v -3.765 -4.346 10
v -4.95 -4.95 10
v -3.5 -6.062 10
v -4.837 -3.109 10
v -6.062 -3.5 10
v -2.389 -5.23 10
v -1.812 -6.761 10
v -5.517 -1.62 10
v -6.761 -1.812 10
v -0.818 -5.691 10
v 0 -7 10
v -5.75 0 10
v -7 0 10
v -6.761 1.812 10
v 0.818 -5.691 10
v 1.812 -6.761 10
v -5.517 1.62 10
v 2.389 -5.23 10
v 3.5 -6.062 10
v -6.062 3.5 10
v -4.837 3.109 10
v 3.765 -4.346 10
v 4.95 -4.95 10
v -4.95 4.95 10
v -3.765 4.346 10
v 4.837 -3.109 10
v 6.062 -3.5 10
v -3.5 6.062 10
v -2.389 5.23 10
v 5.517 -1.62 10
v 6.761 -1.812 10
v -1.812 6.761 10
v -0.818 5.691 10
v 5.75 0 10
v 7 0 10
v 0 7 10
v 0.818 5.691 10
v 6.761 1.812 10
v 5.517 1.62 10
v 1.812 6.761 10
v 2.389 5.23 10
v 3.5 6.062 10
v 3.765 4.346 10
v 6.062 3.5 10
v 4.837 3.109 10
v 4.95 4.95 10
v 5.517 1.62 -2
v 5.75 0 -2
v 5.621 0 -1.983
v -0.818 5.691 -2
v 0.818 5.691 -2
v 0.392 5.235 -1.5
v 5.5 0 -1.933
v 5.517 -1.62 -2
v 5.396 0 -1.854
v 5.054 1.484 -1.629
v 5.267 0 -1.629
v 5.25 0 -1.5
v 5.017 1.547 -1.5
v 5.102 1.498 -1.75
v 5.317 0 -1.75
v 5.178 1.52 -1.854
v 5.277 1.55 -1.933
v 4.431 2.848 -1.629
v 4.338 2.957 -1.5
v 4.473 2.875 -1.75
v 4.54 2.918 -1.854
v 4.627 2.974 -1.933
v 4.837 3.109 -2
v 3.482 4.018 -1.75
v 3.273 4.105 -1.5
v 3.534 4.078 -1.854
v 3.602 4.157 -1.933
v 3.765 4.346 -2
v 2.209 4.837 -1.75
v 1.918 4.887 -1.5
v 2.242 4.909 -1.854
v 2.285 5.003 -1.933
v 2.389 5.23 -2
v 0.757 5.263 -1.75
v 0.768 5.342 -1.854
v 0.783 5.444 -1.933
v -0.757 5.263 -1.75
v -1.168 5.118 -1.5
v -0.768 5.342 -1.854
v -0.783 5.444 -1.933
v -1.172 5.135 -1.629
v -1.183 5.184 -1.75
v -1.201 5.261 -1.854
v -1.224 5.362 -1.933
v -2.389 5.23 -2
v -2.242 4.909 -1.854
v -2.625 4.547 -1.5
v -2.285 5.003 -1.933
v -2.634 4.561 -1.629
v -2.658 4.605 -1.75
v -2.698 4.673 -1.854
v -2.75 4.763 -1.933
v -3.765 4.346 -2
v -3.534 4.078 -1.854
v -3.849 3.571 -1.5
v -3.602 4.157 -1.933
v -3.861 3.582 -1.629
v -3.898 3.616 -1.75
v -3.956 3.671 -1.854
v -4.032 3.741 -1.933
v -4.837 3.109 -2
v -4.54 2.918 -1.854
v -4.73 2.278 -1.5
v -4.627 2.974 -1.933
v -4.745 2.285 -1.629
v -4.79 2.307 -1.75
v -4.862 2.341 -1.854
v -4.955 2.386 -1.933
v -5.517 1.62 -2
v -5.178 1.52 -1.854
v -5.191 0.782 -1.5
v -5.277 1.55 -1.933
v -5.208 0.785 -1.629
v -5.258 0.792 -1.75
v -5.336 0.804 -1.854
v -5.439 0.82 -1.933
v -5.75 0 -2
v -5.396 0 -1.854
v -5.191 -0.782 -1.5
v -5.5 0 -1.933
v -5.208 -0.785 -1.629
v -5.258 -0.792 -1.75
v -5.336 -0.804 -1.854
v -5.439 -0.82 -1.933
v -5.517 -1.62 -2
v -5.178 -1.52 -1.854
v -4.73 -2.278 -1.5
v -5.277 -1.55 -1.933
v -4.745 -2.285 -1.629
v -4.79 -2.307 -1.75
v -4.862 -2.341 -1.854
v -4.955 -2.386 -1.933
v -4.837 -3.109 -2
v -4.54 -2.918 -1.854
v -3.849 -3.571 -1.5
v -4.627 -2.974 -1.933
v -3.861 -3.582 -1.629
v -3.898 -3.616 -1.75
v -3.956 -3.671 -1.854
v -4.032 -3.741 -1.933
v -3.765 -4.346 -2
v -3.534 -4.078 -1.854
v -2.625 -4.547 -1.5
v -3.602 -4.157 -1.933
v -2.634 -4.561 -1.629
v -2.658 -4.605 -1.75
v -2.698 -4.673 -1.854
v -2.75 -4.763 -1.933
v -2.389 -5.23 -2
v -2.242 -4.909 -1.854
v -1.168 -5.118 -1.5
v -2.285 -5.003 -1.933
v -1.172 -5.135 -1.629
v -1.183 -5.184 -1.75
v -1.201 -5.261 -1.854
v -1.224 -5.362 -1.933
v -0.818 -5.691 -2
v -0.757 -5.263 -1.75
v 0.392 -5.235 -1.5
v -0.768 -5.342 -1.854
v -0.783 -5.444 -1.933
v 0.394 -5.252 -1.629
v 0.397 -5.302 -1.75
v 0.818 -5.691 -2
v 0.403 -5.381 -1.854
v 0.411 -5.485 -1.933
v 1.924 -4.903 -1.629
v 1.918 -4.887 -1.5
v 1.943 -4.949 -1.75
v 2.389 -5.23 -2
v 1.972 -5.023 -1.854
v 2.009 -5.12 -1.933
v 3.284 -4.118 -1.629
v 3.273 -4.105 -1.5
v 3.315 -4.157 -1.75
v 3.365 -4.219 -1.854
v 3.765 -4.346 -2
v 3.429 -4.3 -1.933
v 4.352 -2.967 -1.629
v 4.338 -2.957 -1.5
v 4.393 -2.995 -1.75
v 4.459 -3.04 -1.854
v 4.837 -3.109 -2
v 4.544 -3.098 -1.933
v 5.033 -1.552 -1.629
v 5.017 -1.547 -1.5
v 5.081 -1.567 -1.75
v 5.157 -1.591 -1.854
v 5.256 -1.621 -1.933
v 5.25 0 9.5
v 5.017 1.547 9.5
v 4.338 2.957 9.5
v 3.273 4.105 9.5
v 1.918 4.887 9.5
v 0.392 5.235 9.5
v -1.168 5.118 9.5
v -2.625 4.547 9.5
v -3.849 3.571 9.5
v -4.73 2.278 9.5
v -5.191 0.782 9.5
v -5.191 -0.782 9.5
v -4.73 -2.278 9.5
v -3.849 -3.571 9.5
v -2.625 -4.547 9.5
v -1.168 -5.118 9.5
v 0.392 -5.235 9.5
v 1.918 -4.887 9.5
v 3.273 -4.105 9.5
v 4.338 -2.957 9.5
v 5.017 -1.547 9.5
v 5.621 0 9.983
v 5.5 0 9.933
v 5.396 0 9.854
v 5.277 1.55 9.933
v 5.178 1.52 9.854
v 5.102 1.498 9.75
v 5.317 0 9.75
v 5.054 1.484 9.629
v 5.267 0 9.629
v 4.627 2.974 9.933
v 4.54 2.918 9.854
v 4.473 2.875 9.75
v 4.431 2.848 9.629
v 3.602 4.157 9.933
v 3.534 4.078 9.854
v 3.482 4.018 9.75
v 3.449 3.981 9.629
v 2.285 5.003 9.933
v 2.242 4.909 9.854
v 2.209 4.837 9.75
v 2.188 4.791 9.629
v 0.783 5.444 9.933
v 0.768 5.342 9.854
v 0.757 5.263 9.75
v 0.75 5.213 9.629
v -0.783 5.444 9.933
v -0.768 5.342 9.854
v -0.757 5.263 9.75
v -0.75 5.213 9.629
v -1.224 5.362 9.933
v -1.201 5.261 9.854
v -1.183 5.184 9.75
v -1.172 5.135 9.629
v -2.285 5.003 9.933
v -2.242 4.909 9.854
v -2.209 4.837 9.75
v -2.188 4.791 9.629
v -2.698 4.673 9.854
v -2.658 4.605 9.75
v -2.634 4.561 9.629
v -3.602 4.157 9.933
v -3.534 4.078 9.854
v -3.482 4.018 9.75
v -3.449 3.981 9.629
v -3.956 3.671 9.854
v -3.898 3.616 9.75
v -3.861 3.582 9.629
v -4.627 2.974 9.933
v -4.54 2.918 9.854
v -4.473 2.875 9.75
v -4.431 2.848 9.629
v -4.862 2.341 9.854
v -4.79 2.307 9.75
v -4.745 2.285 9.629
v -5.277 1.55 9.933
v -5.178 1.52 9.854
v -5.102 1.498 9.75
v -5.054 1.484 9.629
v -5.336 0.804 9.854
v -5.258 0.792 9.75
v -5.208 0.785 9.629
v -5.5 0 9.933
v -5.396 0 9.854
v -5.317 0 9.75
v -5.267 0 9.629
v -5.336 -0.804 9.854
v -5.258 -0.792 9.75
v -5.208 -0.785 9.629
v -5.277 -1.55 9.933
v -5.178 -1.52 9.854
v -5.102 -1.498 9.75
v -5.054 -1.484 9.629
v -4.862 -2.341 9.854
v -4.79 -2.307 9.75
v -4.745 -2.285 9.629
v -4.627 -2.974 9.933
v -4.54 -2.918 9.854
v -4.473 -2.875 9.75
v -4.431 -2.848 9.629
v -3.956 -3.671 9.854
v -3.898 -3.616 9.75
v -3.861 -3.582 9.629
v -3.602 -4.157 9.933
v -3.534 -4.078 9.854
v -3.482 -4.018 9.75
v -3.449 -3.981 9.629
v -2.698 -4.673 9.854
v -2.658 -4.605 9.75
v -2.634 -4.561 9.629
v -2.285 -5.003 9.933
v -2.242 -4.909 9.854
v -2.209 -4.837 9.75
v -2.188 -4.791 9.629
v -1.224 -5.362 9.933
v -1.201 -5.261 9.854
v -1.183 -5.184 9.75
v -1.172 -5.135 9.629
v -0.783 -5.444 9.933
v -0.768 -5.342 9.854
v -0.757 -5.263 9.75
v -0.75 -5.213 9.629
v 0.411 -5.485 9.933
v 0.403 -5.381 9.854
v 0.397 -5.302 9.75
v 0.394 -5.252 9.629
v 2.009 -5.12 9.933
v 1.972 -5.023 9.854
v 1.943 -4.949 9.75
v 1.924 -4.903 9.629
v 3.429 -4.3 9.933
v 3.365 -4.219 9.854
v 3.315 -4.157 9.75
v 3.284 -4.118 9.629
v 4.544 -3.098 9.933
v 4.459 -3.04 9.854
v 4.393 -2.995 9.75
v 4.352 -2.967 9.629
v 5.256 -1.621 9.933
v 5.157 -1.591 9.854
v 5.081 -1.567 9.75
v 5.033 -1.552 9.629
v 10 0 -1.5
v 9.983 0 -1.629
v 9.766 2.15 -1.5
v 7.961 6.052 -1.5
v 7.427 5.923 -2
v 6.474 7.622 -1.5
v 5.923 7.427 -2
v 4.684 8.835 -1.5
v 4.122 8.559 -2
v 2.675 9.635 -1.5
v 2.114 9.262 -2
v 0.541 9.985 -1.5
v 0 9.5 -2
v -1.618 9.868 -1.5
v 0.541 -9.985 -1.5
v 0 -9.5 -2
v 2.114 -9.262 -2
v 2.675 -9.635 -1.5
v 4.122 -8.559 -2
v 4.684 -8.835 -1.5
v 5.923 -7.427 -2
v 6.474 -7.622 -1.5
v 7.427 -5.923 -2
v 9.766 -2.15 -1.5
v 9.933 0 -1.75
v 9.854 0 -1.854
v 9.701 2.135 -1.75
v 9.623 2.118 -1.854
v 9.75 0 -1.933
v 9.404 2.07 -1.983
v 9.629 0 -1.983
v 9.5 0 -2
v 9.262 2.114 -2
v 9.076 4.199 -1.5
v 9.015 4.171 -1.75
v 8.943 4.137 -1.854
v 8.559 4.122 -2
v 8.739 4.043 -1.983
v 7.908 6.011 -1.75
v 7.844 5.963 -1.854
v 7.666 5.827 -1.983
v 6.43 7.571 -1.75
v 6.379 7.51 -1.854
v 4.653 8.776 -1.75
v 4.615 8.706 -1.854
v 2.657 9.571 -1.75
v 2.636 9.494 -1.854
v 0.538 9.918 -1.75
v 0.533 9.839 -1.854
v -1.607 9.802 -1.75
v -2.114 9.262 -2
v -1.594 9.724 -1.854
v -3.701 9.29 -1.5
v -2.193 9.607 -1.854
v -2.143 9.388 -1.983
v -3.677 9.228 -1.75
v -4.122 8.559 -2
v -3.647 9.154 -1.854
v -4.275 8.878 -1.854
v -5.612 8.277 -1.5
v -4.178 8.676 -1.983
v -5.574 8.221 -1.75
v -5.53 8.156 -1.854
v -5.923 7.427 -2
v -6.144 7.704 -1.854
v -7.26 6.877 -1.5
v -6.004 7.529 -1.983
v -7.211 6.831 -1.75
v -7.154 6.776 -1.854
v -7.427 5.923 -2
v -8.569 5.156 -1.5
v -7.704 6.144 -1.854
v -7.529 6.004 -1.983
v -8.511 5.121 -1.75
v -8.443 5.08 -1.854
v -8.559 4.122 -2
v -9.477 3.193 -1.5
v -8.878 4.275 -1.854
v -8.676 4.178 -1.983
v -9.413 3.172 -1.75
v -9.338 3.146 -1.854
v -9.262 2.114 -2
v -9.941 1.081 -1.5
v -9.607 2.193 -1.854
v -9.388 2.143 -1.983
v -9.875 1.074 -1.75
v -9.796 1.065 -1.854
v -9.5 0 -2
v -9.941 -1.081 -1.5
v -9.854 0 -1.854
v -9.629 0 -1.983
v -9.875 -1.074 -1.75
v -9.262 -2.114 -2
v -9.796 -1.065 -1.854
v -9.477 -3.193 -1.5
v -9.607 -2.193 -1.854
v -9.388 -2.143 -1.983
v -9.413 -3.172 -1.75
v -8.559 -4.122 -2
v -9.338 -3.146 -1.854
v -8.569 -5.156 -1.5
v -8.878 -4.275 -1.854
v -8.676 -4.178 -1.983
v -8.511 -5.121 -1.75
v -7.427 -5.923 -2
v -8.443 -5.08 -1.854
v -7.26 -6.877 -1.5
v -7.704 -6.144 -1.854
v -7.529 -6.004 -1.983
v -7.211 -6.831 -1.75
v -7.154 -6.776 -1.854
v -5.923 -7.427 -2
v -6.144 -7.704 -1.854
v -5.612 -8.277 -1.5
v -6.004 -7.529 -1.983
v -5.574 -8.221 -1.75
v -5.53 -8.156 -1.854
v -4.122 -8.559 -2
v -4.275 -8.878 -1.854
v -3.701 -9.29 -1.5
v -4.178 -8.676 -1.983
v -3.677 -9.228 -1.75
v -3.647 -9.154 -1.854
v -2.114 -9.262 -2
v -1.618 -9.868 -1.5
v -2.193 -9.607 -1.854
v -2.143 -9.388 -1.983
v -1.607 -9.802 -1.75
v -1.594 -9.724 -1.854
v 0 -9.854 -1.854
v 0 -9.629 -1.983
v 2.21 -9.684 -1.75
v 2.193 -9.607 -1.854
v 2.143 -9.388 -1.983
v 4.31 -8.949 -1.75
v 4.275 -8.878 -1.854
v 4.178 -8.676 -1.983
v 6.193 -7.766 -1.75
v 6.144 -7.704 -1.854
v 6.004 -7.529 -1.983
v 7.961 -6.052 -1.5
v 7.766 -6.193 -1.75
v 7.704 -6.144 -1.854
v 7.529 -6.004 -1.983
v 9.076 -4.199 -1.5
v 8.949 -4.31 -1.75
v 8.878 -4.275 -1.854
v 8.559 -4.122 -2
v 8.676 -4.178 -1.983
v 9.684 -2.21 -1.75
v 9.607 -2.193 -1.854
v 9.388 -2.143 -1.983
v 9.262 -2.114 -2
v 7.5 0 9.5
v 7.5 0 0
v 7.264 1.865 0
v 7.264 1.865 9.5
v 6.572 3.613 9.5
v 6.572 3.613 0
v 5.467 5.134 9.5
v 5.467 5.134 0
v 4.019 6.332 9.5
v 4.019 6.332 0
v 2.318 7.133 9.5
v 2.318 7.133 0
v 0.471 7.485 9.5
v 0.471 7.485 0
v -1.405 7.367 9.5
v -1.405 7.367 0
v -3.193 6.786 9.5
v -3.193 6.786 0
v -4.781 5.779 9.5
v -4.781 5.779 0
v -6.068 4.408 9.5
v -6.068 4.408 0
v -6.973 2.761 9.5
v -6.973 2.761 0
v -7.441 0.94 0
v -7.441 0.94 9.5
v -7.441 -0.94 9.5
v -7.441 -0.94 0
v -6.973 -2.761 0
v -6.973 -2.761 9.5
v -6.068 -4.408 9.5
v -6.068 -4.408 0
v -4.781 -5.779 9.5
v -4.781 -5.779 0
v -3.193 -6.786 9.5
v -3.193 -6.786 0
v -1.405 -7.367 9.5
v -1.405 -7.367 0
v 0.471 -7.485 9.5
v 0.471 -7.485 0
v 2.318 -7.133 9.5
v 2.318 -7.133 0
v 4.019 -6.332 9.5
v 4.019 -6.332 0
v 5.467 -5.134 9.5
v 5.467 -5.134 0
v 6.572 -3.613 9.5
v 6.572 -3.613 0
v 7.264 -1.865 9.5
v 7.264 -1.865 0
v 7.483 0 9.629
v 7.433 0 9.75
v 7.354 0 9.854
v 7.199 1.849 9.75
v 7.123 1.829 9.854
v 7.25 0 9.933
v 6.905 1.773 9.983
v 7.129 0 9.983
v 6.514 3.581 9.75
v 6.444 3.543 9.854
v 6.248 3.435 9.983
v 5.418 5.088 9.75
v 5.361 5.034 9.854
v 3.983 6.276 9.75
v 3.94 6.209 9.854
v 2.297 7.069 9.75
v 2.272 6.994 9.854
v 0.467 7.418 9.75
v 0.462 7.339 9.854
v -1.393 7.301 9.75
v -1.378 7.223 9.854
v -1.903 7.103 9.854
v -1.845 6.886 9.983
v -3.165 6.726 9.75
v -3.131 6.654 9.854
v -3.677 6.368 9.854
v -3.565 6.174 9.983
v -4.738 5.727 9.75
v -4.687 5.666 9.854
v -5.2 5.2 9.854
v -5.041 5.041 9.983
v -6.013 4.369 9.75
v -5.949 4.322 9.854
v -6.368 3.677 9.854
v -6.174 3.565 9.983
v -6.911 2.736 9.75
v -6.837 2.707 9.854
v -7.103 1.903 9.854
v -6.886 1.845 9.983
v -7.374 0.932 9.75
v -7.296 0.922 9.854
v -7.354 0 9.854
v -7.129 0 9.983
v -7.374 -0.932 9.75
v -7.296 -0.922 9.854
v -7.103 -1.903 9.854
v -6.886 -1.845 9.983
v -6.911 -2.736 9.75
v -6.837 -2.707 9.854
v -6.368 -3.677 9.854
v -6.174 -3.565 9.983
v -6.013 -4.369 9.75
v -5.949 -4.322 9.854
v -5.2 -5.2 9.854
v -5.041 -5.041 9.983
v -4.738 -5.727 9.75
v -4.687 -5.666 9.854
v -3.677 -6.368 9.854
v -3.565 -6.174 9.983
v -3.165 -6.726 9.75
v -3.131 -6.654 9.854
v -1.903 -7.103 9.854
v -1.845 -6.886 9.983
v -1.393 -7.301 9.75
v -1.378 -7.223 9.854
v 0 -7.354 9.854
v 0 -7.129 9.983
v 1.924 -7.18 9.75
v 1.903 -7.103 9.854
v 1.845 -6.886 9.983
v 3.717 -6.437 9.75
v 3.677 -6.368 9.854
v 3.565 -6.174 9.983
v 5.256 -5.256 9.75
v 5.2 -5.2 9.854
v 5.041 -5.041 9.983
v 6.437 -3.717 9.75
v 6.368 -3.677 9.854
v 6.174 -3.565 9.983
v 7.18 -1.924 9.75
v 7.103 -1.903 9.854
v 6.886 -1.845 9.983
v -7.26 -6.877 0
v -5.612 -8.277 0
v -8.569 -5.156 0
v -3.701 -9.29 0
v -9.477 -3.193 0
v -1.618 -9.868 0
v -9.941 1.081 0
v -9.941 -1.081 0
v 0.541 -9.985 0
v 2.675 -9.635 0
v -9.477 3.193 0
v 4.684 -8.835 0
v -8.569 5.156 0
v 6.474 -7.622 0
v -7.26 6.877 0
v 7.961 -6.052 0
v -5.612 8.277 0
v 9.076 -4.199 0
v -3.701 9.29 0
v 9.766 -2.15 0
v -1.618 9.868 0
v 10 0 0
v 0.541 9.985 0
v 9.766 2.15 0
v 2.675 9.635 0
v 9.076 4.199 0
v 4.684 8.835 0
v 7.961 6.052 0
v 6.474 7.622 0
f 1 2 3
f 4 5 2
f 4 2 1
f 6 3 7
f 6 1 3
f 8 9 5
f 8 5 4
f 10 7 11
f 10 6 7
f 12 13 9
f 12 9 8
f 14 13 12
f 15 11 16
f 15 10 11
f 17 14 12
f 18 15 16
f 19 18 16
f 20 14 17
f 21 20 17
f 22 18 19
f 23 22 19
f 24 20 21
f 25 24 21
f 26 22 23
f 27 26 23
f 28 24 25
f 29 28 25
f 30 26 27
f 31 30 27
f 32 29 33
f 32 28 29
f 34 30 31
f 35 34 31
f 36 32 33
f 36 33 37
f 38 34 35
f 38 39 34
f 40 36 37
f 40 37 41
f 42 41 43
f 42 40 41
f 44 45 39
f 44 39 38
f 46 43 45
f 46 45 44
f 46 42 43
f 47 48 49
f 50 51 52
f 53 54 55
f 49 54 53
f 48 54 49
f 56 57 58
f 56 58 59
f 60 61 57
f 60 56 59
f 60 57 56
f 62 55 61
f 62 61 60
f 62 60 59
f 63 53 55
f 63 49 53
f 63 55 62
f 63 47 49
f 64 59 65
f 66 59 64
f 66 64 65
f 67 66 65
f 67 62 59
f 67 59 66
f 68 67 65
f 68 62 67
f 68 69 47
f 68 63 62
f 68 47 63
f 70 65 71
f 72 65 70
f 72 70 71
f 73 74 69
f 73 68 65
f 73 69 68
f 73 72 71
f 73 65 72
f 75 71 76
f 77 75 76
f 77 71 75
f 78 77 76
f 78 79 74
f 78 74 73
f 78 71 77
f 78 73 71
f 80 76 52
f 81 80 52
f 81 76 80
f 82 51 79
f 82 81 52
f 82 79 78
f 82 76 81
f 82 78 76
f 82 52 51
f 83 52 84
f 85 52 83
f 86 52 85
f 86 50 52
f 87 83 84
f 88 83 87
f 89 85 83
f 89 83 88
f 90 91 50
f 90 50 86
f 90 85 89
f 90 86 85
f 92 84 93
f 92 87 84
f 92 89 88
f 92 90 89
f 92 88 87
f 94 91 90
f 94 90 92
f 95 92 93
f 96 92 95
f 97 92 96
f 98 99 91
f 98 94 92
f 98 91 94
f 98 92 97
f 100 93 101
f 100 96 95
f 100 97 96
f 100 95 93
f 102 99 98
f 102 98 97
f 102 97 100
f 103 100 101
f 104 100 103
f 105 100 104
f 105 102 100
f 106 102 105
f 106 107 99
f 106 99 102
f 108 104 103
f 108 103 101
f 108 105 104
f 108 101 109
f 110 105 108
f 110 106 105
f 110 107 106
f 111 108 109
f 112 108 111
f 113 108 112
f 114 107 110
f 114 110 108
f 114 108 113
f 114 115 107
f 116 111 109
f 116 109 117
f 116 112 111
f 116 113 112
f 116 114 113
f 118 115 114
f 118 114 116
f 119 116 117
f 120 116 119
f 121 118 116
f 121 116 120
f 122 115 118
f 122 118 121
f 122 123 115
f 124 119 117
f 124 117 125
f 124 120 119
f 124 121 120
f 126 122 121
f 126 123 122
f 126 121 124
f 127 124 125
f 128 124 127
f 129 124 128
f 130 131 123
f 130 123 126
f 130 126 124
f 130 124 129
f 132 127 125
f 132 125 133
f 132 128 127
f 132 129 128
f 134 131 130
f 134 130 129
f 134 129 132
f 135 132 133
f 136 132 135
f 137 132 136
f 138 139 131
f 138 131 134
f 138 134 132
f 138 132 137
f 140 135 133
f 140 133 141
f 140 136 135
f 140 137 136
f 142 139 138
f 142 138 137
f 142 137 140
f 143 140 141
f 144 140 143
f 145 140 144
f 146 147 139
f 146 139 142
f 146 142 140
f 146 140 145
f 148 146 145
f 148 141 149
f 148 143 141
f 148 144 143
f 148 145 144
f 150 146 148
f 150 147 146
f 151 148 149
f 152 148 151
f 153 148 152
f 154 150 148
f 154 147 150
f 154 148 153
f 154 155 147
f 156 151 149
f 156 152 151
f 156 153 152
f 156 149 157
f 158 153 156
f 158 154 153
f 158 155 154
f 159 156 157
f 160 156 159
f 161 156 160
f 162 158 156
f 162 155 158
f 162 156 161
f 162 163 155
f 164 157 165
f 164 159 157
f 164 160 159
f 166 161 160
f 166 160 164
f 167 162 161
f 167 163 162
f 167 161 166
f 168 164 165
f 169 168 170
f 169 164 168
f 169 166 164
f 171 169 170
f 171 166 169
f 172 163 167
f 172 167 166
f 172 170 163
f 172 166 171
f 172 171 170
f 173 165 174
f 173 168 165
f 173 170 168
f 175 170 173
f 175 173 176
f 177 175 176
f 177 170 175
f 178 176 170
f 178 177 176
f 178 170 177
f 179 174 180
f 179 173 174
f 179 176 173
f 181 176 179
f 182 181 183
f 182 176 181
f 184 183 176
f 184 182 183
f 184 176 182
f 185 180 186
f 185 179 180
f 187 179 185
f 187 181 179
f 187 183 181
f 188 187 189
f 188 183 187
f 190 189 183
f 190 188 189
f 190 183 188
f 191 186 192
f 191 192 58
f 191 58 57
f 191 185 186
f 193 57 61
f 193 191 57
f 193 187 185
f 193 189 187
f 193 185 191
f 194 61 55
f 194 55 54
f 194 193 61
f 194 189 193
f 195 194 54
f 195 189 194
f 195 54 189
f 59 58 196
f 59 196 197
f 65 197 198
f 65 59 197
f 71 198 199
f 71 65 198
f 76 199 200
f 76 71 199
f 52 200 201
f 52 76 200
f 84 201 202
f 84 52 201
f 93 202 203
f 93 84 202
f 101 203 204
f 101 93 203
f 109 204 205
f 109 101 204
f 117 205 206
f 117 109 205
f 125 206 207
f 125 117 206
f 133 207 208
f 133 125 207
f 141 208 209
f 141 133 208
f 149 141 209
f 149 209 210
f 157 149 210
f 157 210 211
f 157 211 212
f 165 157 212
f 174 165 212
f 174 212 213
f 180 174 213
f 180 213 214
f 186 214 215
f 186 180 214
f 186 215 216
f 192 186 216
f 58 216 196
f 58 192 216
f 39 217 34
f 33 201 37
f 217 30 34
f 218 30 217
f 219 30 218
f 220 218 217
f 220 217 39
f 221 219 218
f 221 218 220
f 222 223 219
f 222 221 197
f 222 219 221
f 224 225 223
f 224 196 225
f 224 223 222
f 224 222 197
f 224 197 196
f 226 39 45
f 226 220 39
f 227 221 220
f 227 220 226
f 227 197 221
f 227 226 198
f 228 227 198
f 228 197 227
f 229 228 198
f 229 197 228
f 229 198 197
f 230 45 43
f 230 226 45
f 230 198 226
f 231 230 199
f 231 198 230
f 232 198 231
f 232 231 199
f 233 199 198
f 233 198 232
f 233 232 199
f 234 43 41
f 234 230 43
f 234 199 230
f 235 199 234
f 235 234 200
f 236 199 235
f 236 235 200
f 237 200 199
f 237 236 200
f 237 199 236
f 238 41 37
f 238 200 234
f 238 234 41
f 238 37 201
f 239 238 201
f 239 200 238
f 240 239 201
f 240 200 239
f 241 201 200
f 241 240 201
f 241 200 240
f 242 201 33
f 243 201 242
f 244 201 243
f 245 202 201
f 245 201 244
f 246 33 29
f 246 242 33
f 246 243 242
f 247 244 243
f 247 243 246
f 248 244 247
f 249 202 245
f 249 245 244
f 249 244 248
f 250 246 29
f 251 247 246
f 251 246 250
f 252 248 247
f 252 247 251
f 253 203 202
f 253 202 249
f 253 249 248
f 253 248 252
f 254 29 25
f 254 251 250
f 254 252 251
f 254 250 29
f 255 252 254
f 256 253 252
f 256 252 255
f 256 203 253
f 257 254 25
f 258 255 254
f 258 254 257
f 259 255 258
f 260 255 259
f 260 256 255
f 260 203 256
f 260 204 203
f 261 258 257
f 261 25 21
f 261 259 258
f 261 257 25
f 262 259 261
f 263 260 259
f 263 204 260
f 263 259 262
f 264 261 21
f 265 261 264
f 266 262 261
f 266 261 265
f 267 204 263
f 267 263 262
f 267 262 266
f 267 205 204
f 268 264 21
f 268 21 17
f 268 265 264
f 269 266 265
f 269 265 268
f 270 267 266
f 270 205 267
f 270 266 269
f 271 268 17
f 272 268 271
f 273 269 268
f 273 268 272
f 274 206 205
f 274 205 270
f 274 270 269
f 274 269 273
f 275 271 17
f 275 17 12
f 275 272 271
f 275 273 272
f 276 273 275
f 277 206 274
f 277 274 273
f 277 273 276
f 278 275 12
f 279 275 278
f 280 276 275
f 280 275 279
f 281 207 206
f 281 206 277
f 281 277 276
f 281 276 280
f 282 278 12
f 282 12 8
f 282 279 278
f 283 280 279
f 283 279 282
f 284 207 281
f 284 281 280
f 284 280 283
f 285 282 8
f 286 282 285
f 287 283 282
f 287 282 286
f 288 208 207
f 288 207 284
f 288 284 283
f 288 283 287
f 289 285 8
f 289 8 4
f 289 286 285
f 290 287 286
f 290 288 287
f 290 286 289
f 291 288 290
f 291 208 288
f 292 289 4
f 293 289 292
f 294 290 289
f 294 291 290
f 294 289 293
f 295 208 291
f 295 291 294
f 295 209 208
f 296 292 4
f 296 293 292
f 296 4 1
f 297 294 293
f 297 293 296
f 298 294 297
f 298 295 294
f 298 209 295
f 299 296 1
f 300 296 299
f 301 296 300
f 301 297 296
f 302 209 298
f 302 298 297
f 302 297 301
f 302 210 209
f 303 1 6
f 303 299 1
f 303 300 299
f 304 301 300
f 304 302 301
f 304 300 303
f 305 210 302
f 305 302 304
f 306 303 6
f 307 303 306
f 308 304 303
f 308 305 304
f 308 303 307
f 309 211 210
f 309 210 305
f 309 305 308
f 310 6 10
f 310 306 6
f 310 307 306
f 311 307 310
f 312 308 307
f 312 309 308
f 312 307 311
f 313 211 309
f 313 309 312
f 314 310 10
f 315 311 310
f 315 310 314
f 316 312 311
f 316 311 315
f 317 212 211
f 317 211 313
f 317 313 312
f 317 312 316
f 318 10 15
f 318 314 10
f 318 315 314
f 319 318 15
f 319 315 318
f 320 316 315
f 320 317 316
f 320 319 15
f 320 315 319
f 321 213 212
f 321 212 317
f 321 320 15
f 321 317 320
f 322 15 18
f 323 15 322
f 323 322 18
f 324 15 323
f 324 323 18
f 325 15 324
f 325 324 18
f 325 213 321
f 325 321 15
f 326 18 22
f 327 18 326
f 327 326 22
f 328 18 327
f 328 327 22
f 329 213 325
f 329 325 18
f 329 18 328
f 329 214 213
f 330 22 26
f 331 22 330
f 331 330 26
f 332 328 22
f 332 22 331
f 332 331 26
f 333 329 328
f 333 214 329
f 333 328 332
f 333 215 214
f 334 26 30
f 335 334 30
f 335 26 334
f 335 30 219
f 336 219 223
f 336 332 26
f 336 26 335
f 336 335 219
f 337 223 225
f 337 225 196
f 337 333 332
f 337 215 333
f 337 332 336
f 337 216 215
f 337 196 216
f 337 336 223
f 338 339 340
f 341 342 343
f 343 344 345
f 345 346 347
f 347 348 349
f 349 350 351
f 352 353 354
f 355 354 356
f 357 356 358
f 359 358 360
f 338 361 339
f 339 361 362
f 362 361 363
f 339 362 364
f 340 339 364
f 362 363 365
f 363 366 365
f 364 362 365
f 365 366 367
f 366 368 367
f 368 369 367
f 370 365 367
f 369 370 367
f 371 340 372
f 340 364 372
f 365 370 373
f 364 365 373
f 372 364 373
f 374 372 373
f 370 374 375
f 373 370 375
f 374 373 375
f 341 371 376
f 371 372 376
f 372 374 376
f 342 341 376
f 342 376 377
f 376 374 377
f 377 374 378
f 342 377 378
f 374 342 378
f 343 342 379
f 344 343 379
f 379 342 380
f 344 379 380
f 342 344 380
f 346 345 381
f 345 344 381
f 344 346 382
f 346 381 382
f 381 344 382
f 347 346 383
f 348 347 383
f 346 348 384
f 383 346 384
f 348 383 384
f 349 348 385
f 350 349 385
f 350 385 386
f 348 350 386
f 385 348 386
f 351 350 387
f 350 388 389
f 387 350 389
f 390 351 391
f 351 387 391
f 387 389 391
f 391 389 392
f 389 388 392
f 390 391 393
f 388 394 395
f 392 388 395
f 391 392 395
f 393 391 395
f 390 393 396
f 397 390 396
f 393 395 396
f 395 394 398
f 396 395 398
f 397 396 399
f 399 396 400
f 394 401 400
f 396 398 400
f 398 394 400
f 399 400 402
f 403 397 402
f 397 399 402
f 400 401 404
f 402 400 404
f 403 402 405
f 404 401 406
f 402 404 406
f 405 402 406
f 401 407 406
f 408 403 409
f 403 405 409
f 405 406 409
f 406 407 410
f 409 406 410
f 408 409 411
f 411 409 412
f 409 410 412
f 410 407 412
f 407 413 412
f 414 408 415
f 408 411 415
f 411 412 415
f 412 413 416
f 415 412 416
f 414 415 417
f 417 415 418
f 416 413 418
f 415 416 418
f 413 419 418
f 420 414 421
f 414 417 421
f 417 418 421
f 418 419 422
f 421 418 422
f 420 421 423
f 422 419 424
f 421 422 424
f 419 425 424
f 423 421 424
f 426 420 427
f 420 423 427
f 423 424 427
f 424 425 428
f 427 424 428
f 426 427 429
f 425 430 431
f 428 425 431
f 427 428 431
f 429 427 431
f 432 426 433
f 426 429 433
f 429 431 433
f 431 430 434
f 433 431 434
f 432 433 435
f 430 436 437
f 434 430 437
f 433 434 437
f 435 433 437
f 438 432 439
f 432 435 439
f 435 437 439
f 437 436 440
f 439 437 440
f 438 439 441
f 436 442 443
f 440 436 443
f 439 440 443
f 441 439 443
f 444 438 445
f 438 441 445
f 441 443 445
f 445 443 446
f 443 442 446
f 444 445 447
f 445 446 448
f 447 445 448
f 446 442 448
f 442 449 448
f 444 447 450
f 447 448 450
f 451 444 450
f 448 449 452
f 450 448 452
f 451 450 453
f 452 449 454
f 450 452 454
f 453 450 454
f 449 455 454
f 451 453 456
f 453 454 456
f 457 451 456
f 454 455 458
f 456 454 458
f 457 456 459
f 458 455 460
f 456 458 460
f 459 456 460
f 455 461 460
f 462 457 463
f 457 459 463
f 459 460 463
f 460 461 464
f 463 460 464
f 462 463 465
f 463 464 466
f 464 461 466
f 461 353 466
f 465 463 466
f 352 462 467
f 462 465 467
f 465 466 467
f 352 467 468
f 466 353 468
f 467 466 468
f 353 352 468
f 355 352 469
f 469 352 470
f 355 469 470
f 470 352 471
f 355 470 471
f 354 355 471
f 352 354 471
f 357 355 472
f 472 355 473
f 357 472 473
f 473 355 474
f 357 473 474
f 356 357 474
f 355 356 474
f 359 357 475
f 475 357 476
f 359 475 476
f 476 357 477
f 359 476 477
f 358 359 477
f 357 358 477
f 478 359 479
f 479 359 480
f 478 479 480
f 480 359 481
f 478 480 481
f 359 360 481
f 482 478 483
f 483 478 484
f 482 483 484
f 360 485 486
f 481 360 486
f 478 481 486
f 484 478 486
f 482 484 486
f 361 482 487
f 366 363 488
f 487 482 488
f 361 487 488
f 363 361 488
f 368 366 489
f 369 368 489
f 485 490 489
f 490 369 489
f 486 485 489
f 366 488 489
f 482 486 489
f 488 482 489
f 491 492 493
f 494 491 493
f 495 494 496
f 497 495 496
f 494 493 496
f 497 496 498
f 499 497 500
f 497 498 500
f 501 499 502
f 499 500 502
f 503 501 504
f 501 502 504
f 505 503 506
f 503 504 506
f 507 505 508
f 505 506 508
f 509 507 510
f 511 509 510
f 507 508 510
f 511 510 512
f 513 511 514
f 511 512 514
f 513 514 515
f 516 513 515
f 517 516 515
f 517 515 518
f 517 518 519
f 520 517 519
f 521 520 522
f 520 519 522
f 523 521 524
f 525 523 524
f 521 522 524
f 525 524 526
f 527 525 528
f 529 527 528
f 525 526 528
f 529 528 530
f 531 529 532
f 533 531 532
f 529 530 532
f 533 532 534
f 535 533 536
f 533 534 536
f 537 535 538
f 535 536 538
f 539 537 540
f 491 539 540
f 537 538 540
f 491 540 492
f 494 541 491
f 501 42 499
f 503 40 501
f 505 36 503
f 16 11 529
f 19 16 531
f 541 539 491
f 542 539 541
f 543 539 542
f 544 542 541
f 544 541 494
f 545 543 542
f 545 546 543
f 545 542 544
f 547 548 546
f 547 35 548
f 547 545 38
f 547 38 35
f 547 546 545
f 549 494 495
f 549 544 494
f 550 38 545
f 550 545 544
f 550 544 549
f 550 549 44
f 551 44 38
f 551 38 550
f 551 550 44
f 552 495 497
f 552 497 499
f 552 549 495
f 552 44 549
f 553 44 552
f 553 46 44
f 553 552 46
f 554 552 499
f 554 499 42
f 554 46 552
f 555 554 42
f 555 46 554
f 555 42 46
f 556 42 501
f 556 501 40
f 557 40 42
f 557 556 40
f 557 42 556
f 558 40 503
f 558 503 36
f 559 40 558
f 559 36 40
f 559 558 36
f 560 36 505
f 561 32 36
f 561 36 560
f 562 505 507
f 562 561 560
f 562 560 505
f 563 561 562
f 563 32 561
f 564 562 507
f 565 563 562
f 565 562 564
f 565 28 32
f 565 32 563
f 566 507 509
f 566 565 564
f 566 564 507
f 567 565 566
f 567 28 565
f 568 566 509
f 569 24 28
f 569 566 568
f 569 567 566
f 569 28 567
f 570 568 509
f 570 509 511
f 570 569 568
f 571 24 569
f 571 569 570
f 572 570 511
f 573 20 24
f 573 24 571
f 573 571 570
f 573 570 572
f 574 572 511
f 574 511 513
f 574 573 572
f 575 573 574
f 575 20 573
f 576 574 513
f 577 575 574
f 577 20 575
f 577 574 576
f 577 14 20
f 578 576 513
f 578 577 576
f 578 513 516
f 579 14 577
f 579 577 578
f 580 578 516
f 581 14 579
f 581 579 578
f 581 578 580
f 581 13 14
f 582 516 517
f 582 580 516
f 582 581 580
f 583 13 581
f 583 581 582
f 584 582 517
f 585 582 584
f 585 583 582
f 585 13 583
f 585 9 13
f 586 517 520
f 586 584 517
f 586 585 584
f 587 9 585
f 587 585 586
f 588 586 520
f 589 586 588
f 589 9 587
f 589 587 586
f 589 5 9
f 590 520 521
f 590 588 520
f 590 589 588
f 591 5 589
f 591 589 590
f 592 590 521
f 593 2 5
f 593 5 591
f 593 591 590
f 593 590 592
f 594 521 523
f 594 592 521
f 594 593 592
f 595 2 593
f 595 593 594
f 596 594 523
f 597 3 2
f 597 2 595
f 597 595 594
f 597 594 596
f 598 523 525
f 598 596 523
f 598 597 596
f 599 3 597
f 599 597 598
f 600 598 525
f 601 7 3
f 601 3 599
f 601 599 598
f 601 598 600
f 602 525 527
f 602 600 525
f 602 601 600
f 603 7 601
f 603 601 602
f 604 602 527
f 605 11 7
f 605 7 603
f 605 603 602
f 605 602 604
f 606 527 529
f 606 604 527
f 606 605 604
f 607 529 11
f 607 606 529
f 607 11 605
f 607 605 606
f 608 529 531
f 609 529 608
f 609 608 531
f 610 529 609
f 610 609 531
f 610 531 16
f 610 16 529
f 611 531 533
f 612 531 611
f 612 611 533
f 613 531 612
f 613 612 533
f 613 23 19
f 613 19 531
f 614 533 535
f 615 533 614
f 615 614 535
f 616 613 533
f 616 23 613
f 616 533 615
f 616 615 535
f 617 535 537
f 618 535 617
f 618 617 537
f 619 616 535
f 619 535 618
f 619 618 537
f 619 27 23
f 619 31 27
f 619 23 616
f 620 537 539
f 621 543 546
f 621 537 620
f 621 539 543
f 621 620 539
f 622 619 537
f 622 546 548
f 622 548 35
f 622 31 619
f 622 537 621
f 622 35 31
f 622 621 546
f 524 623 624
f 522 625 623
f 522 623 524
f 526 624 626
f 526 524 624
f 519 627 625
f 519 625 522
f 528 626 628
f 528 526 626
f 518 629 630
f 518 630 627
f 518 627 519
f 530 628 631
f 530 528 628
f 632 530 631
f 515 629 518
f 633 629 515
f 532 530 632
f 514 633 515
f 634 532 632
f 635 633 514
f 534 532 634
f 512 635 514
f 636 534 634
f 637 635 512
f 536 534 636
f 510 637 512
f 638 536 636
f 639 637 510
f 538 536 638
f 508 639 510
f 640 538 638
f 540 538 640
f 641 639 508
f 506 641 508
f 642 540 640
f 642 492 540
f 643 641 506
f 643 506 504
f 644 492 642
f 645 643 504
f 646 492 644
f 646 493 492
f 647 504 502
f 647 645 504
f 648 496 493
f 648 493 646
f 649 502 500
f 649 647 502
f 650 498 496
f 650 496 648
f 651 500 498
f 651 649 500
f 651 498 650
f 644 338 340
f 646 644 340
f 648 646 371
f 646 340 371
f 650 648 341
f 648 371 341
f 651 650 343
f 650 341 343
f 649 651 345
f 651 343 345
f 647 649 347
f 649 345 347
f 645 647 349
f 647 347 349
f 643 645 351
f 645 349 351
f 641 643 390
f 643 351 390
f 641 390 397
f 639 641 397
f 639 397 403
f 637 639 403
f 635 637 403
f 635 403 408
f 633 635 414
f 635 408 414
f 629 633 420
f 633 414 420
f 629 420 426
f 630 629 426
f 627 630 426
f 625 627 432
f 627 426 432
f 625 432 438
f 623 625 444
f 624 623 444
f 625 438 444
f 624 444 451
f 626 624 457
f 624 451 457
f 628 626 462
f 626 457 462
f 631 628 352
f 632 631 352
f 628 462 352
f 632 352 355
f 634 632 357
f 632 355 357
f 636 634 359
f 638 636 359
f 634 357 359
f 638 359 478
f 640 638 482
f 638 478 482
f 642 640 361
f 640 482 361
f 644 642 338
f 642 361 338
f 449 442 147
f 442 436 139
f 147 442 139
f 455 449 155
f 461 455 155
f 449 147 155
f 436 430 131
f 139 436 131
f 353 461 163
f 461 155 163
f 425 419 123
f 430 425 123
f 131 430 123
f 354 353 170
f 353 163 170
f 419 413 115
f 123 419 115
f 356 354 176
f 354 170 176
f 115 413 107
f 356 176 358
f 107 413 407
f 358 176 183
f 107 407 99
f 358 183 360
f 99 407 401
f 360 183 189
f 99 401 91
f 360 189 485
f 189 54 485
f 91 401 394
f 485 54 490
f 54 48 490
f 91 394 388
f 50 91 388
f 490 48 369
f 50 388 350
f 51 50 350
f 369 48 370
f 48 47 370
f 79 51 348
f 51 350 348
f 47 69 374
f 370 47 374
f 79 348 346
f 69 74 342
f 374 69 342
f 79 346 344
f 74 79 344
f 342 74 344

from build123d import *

# Parameters (mm, degrees)
SKICA1_R                = 7.5
SKICA1_R_2              = 5.25
P_IDAT_VYSUNUT_M1_DEPTH = 10
P_IDAT_START            = -2
SKICA1_3_R              = 10
SKICA1_3_R_2            = 5.25
P_IDAT_VYSUNUT_M2_DEPTH = 2
ZAOBLIT1_R              = 0.5


with BuildPart() as part:
    # Skica1 → Přidat vysunutím1 (new body)
    with BuildSketch(Plane.XY):
        Circle(SKICA1_R)
        Circle(SKICA1_R_2, mode=Mode.SUBTRACT)
    extrude(amount=P_IDAT_VYSUNUT_M1_DEPTH)

    # Skica1<3> → Přidat vysunutím2 (add)
    with BuildSketch(Plane.XY.offset(P_IDAT_START)):
        Circle(SKICA1_3_R)
        Circle(SKICA1_3_R_2, mode=Mode.SUBTRACT)
    extrude(amount=P_IDAT_VYSUNUT_M2_DEPTH)

    # Zaoblit1
    zaoblit1_edges = [part.edges().sort_by_distance(p)[0] for p in [
        (-7.5, 0, 10),
        (-5.25, 0, 10),
        (-5.25, 0, -2),
        (-10, 0, -2),
    ]]
    fillet(zaoblit1_edges, radius=ZAOBLIT1_R)


solid = part.part
